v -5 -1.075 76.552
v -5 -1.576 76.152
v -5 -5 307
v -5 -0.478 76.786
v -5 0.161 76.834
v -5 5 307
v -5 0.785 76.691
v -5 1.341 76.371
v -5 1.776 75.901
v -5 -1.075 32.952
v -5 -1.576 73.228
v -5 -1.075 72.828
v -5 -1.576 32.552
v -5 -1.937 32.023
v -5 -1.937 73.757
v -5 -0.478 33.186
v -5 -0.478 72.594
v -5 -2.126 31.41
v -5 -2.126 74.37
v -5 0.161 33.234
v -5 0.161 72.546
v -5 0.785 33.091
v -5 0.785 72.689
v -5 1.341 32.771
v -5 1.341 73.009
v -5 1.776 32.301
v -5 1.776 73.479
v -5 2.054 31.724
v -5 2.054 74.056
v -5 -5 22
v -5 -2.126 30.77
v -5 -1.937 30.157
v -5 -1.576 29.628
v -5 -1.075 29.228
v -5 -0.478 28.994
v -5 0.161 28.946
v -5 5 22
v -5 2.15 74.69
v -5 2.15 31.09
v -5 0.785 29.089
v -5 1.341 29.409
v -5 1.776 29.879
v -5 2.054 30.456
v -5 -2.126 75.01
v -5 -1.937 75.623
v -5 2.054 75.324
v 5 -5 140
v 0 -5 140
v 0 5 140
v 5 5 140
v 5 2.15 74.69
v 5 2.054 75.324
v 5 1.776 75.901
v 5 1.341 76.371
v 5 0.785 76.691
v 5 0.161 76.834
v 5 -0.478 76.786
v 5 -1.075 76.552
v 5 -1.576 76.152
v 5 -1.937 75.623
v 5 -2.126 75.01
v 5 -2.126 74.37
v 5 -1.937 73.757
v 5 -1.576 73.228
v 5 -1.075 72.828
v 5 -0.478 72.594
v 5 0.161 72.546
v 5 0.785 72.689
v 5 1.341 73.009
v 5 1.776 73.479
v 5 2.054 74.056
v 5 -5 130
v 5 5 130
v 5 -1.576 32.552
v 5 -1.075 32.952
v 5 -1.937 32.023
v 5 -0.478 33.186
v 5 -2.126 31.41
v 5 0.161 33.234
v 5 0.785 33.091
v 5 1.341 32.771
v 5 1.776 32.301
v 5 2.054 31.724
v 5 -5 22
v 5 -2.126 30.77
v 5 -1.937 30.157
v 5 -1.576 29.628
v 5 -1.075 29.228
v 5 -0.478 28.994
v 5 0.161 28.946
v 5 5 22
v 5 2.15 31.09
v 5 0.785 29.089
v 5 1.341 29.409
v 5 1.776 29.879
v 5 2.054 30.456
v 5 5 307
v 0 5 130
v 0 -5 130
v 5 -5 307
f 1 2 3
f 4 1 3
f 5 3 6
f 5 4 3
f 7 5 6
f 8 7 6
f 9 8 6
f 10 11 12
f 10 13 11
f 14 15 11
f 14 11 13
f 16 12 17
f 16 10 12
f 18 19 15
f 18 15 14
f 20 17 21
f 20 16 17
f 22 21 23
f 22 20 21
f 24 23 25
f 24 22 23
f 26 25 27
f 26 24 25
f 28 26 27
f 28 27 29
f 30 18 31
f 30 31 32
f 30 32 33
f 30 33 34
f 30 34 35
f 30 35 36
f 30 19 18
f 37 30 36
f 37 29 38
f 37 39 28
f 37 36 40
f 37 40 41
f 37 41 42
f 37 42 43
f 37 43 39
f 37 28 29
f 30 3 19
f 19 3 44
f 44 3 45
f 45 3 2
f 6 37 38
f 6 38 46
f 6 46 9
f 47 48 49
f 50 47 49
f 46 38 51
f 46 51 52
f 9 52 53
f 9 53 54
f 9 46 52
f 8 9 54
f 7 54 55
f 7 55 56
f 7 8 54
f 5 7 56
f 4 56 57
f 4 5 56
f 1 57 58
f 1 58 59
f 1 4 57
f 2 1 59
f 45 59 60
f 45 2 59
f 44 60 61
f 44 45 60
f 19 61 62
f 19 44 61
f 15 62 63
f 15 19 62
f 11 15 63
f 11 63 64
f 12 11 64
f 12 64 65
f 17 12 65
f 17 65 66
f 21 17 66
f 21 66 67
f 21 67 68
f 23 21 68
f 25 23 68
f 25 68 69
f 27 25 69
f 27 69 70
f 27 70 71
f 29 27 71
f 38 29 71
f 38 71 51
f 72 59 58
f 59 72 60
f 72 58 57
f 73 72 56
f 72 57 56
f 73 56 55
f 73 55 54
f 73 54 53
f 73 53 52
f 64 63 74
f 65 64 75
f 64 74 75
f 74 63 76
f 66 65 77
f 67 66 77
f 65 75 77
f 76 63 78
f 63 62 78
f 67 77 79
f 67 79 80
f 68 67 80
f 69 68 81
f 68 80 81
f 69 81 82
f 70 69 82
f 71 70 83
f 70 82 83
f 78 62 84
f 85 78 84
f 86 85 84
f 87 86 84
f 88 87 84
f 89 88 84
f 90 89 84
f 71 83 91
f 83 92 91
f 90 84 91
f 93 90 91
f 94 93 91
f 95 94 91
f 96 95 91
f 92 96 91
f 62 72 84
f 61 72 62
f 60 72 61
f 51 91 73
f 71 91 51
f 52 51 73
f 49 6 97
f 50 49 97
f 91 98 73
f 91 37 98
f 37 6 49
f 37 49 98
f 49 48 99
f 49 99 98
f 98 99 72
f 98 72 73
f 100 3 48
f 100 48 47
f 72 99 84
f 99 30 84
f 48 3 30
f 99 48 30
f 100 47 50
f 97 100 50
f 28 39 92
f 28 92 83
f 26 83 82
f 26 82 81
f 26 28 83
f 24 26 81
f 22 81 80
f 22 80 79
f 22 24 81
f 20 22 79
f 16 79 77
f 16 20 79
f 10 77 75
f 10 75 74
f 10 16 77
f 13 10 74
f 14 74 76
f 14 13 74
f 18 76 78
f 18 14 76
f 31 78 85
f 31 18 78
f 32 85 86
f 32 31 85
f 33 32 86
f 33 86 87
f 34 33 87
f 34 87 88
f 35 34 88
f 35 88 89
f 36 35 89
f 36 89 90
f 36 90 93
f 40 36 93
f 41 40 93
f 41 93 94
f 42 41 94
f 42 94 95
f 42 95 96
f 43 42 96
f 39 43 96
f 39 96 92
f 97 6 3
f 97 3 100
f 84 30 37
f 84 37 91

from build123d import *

# Parameters (mm, degrees)
ESQUISSE1_W                  = 10
ESQUISSE1_H                  = 10
BOSS_EXTRU_1_DEPTH           = 307
ENL_V_MAT_EXTRU_1_DEPTH      = 308.081422427
ENL_V_MAT_EXTRU_1_DEPTH_BACK = 308.081422427
ESQUISSE2_W                  = 10
ESQUISSE2_H                  = 22
D_GAGEMENT_M41_OUTLINE_W     = 10
D_GAGEMENT_M41_OUTLINE_H     = 10
D_GAGEMENT_M41_OUTLINE_R     = 2.15
D_GAGEMENT_M41_DEPTH         = 5
D_GAGEMENT_START             = -5
D_GAGEMENT_M41_2_OUTLINE_R   = 2.15
D_GAGEMENT_M41_2_DEPTH       = 5


# Read off the part's stored shape, not the designer's step: Dégagement M41
with BuildPart() as part:
    # Esquisse1 → Boss.-Extru.1 (new body)
    with BuildSketch(Plane.XY):
        Rectangle(ESQUISSE1_W, ESQUISSE1_H)
    extrude(amount=BOSS_EXTRU_1_DEPTH)

    # Esquisse2 → Enlèv. mat.-Extru.1 (cut, two sides: drawn at the far end of the back side and taken through both)
    with BuildSketch(Plane(origin=(0, 0, 0), x_dir=(1, 0, 0), z_dir=(0, 1, 0)).offset(-ENL_V_MAT_EXTRU_1_DEPTH_BACK)):
        with Locations((0, -11)):
            Rectangle(ESQUISSE2_W, ESQUISSE2_H)
    extrude(amount=ENL_V_MAT_EXTRU_1_DEPTH + ENL_V_MAT_EXTRU_1_DEPTH_BACK, mode=Mode.SUBTRACT)

    # Dégagement M41 outline → Dégagement M41 (cut)
    with BuildSketch(Plane.YZ):
        with Locations((0, 135)):
            Rectangle(D_GAGEMENT_M41_OUTLINE_W, D_GAGEMENT_M41_OUTLINE_H)
        with Locations((0, 31.09)):
            Circle(D_GAGEMENT_M41_OUTLINE_R)
        with Locations((0, 74.69)):
            Circle(D_GAGEMENT_M41_OUTLINE_R)
    extrude(amount=D_GAGEMENT_M41_DEPTH, mode=Mode.SUBTRACT)

    # D_gagement M41 2 outline → D_gagement M41 2 (cut)
    with BuildSketch(Plane.YZ.offset(D_GAGEMENT_START)):
        with Locations((0, 31.09)):
            Circle(D_GAGEMENT_M41_2_OUTLINE_R)
        with Locations((0, 74.69)):
            Circle(D_GAGEMENT_M41_2_OUTLINE_R)
    extrude(amount=D_GAGEMENT_M41_2_DEPTH, mode=Mode.SUBTRACT)


solid = part.part
